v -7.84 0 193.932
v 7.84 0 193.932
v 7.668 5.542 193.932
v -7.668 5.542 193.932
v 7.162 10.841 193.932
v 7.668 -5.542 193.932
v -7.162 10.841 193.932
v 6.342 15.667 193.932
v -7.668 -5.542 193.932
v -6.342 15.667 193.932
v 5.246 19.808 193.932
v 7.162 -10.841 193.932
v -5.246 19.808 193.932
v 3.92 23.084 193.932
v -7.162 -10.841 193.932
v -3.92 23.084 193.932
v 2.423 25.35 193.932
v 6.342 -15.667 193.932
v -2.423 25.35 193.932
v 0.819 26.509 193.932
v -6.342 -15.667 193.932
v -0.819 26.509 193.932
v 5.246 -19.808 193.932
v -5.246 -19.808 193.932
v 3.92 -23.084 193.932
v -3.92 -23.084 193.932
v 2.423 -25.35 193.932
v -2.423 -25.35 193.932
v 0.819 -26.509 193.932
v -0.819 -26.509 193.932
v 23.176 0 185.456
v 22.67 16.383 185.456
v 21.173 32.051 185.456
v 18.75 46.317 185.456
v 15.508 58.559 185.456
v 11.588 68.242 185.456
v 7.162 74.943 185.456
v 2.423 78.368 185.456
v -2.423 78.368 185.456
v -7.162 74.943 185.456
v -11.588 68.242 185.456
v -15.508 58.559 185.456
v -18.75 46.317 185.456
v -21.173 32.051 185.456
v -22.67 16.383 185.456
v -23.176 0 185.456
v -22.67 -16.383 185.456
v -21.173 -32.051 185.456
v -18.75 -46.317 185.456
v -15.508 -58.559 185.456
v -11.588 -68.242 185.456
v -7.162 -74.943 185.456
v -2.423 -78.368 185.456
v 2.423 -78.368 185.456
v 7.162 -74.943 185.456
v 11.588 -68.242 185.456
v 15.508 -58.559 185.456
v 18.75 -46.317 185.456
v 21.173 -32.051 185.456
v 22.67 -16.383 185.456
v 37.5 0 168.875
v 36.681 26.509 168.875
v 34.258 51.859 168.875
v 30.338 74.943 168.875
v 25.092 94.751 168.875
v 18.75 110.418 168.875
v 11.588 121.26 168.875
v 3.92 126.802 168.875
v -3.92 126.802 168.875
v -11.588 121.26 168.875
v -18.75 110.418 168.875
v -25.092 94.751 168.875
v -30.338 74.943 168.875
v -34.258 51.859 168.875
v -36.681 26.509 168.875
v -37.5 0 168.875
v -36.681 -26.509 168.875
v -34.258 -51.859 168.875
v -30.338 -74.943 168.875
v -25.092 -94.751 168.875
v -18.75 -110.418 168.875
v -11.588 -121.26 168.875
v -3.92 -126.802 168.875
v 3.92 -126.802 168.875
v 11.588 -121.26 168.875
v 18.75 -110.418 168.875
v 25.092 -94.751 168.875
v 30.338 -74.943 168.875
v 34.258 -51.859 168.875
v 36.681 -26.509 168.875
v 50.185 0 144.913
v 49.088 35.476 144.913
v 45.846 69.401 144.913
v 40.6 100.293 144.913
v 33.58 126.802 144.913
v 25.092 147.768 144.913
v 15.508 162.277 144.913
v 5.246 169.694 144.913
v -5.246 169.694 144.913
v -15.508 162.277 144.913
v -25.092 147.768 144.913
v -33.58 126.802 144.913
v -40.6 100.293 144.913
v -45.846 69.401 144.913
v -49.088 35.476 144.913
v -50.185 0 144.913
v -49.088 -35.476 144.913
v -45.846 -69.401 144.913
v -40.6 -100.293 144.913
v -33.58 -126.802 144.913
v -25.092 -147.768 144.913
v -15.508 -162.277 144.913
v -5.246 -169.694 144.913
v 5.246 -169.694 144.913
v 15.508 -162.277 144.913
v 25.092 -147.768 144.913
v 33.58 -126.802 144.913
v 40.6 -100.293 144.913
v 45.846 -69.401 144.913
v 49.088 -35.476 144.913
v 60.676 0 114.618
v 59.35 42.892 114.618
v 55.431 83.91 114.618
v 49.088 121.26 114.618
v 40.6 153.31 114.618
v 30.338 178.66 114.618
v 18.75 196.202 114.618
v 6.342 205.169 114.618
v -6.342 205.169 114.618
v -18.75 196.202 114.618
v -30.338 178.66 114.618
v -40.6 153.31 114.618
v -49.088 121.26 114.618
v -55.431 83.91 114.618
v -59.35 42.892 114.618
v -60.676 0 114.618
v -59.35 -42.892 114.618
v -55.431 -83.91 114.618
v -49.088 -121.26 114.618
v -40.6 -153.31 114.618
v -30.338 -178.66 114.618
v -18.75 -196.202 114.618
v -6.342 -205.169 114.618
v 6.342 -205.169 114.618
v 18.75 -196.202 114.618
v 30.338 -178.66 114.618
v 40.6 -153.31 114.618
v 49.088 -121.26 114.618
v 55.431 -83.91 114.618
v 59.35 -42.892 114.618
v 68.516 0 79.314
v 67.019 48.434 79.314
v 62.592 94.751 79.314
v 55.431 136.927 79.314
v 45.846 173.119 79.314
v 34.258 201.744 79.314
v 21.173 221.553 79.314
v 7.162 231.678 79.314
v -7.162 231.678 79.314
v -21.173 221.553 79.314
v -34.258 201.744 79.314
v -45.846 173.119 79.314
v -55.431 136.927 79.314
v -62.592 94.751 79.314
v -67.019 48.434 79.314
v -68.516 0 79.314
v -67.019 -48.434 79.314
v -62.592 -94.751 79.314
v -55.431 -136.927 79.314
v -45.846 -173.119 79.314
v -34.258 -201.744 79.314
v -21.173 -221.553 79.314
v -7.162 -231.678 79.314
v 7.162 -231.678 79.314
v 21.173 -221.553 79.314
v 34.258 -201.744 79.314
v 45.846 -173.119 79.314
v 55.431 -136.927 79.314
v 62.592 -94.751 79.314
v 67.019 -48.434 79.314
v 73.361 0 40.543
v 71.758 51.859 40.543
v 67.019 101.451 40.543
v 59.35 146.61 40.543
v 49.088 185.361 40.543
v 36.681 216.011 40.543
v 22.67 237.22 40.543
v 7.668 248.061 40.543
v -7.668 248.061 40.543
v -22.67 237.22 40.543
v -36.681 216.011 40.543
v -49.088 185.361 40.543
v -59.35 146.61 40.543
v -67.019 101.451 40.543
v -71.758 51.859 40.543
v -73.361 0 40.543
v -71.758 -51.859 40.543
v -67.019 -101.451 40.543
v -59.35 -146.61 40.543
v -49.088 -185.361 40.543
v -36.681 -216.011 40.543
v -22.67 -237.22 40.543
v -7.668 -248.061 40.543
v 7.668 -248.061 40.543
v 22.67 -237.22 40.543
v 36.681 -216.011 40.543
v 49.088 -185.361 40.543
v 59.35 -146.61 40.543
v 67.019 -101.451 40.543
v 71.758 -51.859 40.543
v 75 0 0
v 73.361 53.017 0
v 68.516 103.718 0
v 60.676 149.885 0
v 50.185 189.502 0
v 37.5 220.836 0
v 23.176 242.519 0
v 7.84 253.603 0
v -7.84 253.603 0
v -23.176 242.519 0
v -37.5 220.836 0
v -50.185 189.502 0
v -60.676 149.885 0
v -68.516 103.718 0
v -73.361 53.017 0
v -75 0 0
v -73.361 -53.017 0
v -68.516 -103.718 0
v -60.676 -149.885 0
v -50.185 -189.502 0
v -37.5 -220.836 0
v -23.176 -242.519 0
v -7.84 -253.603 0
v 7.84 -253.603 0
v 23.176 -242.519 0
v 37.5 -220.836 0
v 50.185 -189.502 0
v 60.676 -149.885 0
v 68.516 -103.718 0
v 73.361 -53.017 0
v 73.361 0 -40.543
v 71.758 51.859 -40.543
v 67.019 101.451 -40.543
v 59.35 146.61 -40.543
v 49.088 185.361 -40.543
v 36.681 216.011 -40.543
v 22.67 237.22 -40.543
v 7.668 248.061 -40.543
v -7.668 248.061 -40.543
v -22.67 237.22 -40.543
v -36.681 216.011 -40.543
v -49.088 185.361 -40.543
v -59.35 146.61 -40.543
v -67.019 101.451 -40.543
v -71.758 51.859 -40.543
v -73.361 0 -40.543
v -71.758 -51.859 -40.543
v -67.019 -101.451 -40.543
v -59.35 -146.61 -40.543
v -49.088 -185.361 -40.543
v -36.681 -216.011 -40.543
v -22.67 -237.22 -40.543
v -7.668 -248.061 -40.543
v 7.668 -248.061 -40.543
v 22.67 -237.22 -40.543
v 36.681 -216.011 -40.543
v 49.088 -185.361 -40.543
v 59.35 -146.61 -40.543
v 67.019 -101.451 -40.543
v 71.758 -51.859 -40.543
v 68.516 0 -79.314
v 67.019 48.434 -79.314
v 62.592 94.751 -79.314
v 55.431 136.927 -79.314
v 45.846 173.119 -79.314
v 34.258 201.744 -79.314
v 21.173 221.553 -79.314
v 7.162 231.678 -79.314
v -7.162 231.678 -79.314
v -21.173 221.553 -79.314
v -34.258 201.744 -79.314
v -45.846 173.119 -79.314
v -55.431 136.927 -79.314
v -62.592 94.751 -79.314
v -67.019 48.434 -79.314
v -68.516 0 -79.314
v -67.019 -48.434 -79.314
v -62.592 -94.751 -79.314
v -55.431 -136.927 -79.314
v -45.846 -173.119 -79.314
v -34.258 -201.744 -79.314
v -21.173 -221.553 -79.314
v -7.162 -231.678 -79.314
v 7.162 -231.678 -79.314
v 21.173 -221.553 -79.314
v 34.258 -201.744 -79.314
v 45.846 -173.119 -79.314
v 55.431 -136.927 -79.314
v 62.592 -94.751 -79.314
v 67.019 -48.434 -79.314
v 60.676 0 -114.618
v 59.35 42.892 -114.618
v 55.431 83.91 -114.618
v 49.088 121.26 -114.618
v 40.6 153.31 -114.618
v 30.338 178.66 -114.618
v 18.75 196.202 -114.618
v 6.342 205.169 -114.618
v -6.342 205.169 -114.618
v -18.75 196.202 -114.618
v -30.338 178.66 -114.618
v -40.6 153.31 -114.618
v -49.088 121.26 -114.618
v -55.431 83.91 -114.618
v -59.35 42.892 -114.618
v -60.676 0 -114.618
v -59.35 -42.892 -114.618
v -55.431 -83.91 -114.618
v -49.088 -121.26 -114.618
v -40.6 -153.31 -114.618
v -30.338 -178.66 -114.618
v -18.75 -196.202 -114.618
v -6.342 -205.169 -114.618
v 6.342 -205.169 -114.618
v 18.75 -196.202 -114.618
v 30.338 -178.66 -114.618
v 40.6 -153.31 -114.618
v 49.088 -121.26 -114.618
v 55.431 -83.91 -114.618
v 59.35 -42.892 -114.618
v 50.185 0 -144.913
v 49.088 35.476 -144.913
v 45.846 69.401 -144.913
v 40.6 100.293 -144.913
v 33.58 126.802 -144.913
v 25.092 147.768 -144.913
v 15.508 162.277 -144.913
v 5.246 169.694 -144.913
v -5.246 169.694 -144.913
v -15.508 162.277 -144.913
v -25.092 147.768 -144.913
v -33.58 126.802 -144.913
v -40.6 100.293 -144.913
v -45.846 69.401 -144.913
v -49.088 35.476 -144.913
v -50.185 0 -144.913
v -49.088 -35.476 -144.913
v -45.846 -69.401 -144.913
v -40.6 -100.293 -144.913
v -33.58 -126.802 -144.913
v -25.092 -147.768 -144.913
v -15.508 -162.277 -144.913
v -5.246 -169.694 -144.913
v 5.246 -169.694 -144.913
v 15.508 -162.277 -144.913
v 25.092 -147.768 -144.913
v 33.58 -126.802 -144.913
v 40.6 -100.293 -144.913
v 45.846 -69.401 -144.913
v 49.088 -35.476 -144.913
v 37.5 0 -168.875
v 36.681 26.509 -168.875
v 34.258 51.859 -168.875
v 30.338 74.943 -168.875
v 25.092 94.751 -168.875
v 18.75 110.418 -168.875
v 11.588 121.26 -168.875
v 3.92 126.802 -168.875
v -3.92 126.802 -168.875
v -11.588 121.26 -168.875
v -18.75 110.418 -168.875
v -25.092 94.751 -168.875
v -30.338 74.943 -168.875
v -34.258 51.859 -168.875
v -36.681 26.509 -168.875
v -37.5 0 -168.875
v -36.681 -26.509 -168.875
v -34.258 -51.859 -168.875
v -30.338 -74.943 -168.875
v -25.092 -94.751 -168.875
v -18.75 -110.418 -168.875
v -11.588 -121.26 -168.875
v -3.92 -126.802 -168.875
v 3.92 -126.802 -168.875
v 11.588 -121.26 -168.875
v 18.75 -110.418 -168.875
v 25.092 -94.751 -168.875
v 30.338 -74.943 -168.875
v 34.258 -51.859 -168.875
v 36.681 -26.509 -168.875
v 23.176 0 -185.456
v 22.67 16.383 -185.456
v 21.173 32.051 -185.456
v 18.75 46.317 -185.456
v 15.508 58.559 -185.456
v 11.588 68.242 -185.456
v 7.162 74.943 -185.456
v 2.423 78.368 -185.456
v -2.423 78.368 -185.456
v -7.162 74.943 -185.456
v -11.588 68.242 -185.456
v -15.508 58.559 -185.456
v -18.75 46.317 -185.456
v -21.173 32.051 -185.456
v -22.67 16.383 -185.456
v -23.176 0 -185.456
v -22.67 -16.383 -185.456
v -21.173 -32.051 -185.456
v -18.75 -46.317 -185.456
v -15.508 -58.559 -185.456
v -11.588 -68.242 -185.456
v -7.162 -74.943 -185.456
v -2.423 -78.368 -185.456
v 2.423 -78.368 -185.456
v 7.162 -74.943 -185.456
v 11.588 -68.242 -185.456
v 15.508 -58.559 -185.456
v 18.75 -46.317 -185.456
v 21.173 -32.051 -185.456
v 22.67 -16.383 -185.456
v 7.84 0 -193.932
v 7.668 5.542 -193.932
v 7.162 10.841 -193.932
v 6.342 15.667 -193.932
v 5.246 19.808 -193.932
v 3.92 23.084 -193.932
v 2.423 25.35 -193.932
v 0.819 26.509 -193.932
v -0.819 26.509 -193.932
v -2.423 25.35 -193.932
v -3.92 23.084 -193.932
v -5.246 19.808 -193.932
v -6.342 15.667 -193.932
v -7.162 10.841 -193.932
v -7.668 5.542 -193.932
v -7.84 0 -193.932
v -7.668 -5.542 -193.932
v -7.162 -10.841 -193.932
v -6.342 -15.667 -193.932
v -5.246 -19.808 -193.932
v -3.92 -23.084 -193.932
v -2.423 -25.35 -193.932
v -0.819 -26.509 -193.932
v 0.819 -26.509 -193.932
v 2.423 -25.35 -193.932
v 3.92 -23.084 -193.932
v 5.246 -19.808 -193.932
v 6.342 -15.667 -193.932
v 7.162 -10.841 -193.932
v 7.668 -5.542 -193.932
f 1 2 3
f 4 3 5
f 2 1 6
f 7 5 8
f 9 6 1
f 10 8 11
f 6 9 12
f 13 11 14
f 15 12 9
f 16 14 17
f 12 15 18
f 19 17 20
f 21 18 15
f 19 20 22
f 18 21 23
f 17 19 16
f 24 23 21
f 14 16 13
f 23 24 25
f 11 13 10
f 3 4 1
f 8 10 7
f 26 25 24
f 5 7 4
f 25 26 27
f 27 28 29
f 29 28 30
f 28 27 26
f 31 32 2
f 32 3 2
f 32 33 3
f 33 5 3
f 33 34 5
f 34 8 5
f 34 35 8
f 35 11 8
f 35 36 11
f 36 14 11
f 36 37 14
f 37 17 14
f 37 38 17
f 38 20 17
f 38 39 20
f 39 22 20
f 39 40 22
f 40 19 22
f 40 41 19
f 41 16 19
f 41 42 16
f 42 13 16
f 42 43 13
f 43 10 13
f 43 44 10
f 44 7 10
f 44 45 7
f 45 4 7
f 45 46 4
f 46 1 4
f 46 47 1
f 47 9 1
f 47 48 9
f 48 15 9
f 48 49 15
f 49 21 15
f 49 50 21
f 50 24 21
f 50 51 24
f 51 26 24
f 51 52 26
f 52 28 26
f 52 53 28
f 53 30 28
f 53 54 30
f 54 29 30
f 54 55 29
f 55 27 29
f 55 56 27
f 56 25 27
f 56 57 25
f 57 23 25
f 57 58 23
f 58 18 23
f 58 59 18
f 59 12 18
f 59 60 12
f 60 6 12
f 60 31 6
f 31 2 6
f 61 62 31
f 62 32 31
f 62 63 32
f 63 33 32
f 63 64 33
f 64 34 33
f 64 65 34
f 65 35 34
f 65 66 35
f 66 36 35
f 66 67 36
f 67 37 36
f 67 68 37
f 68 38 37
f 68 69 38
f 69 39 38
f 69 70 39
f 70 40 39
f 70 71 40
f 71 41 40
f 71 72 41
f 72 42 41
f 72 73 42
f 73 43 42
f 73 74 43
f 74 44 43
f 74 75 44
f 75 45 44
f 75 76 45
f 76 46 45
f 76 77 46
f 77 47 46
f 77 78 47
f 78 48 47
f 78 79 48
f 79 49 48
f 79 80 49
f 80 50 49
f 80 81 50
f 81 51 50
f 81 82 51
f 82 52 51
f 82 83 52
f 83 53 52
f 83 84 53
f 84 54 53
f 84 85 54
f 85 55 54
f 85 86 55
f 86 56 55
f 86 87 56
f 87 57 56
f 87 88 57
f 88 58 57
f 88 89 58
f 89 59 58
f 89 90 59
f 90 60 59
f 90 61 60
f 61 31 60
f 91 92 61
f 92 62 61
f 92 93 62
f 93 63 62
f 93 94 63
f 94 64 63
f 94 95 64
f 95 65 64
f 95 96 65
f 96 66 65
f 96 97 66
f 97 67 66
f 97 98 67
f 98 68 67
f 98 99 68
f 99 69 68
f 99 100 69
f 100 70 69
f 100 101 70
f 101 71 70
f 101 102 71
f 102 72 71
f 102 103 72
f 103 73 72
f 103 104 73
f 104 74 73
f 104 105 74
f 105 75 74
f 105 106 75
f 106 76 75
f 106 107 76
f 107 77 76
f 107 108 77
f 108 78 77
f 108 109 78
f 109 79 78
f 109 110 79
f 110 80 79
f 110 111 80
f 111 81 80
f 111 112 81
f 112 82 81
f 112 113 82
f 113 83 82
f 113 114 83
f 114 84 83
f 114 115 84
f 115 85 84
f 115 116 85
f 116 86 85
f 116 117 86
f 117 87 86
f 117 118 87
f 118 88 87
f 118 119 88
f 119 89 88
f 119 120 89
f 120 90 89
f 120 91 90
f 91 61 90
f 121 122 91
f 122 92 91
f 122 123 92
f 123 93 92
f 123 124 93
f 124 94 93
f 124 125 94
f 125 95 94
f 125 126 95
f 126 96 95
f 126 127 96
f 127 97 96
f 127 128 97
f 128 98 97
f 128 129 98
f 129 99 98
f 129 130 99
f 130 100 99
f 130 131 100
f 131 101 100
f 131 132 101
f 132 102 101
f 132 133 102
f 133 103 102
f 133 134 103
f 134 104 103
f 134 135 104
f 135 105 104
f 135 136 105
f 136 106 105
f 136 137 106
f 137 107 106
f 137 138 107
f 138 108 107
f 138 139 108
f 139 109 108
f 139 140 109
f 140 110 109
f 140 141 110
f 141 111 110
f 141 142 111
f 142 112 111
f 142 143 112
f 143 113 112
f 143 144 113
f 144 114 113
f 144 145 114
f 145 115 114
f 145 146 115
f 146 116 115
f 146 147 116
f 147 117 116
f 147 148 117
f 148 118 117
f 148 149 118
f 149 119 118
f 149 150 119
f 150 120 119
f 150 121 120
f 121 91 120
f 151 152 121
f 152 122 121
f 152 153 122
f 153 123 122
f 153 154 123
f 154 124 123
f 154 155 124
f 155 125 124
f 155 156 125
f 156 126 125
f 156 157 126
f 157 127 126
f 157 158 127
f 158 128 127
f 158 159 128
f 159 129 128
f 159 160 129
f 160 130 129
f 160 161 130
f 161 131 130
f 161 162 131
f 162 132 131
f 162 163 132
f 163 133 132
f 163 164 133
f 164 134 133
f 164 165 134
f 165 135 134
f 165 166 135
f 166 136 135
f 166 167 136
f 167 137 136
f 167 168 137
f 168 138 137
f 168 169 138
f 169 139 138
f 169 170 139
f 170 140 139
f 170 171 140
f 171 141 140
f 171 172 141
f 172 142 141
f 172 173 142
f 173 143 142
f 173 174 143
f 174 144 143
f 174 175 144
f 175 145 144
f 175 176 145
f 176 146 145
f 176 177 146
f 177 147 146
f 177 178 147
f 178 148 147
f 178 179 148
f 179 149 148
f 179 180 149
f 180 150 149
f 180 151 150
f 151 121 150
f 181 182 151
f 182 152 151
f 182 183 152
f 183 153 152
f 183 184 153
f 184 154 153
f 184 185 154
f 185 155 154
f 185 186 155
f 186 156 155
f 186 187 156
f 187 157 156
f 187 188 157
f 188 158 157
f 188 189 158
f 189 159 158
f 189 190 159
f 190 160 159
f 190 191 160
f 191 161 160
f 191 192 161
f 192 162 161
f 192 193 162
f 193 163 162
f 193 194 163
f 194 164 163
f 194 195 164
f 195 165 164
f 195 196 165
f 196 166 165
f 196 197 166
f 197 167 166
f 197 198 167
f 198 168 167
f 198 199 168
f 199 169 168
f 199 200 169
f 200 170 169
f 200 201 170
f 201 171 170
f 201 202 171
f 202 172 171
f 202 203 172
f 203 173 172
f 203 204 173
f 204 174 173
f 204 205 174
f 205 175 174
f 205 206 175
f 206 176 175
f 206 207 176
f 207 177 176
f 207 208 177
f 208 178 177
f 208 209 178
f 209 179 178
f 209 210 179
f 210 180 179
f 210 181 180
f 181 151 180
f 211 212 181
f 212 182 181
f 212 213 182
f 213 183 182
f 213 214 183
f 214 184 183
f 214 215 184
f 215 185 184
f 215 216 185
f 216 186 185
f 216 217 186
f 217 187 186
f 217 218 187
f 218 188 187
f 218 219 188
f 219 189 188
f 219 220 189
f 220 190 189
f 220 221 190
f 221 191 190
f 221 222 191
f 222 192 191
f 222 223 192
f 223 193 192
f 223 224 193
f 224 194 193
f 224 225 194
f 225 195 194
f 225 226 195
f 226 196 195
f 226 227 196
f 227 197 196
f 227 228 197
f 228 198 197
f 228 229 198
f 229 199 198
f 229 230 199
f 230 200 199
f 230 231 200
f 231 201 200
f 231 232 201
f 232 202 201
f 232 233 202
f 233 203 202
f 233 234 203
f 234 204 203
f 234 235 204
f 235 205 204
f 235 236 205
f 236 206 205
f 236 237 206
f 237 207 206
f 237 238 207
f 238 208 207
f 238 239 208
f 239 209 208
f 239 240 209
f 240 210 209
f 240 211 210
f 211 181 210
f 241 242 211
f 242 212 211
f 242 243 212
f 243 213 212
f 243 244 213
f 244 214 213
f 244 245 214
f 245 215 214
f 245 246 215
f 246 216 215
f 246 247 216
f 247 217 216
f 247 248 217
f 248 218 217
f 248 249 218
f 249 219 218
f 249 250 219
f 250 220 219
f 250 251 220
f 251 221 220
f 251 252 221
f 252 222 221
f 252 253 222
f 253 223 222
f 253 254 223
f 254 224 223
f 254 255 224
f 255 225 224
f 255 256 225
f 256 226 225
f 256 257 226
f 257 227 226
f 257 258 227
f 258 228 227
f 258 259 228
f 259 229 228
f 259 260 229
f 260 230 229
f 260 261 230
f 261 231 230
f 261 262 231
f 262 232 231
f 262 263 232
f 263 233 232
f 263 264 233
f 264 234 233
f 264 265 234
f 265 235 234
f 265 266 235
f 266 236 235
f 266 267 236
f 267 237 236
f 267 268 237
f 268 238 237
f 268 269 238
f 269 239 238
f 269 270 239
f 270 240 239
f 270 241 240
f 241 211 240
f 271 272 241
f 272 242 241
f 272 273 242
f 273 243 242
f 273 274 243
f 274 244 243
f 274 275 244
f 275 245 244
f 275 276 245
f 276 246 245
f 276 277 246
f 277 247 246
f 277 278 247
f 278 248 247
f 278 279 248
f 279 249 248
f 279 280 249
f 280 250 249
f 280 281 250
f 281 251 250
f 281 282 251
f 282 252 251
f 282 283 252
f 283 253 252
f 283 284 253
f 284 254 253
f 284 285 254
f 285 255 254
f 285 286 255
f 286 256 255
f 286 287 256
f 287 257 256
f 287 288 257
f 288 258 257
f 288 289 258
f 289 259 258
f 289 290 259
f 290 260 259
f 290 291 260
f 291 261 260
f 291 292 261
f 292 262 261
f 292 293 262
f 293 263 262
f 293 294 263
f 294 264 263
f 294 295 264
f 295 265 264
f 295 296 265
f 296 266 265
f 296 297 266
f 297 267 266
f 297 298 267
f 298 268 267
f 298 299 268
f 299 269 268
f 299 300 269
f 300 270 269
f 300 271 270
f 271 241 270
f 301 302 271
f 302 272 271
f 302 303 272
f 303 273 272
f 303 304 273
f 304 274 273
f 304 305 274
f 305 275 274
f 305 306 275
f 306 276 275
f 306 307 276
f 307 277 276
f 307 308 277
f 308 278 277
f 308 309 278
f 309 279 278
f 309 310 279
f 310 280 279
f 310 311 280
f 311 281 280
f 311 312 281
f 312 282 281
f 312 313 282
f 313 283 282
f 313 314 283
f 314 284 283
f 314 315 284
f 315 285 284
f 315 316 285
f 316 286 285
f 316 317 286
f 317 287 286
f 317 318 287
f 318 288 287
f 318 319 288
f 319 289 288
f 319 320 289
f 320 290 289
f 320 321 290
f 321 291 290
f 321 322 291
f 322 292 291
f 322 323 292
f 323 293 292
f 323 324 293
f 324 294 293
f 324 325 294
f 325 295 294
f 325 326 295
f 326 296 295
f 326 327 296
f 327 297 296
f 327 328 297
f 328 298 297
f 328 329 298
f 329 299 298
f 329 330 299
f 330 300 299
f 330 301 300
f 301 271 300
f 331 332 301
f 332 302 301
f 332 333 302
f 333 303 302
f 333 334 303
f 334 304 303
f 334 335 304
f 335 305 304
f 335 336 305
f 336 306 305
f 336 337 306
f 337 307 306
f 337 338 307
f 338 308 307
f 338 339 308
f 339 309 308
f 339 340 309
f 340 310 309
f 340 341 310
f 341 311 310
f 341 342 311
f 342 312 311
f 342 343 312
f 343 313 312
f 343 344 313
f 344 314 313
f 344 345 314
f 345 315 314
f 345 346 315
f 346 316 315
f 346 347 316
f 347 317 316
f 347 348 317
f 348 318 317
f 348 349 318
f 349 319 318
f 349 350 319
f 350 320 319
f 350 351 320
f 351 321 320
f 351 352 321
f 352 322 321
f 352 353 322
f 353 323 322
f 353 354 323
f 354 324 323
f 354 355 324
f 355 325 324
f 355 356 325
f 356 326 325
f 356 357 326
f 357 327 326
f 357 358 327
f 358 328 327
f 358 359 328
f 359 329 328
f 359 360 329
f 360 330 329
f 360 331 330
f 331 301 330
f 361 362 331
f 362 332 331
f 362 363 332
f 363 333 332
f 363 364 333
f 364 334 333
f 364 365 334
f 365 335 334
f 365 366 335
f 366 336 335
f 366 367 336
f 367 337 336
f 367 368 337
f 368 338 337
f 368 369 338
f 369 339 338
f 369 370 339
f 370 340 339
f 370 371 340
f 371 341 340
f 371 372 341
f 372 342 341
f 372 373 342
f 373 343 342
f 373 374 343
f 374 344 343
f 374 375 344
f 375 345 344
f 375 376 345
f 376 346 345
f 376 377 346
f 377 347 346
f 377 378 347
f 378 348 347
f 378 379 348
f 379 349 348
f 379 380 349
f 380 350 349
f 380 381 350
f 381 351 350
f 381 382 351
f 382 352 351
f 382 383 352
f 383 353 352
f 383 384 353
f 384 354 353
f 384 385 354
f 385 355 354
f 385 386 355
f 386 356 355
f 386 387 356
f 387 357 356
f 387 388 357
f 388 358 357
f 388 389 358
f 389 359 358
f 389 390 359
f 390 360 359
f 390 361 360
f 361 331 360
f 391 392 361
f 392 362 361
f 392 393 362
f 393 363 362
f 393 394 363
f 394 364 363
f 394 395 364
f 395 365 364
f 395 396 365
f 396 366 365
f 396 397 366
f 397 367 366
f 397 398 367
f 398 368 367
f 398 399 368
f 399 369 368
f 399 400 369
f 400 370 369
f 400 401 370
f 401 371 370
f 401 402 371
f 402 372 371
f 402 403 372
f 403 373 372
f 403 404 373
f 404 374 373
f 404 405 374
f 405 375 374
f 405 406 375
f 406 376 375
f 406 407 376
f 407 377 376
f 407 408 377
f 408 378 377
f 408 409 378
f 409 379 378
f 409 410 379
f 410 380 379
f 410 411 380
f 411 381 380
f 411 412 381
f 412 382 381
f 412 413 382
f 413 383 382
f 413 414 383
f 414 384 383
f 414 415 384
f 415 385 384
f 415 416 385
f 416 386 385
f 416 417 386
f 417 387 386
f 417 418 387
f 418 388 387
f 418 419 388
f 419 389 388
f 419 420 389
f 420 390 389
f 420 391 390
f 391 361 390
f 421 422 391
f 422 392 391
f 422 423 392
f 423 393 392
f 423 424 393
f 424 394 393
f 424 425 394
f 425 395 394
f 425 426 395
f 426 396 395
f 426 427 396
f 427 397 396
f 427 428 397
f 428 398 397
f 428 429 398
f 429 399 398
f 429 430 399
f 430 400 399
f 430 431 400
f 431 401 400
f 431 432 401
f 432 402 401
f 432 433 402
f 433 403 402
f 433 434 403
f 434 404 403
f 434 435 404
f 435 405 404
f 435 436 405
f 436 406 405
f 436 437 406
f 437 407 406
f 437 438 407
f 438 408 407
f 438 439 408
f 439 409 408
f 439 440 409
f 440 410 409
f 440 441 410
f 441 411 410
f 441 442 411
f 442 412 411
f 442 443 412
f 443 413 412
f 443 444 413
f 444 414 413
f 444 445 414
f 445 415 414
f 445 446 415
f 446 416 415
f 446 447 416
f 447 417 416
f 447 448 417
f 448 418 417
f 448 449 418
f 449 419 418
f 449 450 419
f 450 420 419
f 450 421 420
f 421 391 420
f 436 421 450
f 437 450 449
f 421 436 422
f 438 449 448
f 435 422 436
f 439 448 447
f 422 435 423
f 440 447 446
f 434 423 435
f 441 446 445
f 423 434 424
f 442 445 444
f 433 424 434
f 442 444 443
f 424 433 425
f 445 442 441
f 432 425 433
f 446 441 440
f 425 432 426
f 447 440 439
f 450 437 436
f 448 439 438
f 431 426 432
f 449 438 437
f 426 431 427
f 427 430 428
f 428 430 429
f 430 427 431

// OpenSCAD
// Generated by SolidPython 1.0.1 on 2020-07-29 00:46:47


scale(v = [5, 17, 13]) {
	sphere(r = 15);
}
/***********************************************
*********      SolidPython code:      **********
************************************************
 
# import packages: SolidPython
from solid import *
from solid.utils import *
from itertools import chain, combinations, permutations


class Resize:

    def __init__(self, scad_file):
        self.scad_file = scad_file
        #self.scad_file = import_scad(scad_file)
        # cone/cylinder param:
        self.r1 = 0
        self.r2 = 0
        self.h = 0
        # rectangular prism param:
        self.w = 0
        self.l = 0
        # ellipse param:
        self.r = 0

    # import OpenScad code (file name corresponds to shape)


    # classify shape + parameters
    def assign(self, param1, param2, param3):
        if self.scad_file == 'cone.scad':
            self.r1 = param1
            self.r2 = param2
            self.h = param3
        elif self.scad_file == 'cylinder.scad':
            self.r1 = param1
            self.r2 = param2
            self.h = param3
        elif self.scad_file == 'rectangularPrism.scad':
            self.h = param1
            self.l = param2
            self.w = param3
        else:
            self.r = param1
            self.h = param2

    # resize parameters
    def iterate(self):
        x = range(3, 20, 2)
        i = 1
        if self.scad_file == 'cone.scad':
            tempList = list(permutations(x, 2))
            for temp in tempList:
                param1 = temp[0]
                param2 = temp[1]
                filepath = 'produced_scad_files/' + 'cone' + str(param1) + '_' + str(param2) + '_' + '.scad'
                scad_render_to_file(cylinder(h=param1, r1=param2, r2=0), filepath)

        elif self.scad_file == 'cylinder.scad':
            tempList = list(permutations(x, 3))
            for temp in tempList:
                param1 = temp[0]
                param2 = temp[1]
                filepath = 'produced_scad_files/' + 'cylinder' + str(param1) + '_' + str(param2) + '_' + '.scad'
                scad_render_to_file(cylinder(h=param1, r1=param2, r2=param2), filepath)

        elif self.scad_file == 'rectangularPrism.scad':
            tempList = list(permutations(x, 3))
            for temp in tempList:
                param1 = temp[0]
                param2 = temp[1]
                param3 = temp[2]
                filepath = 'produced_scad_files/' + 'rectangularPrism' + str(param1) + '_' + str(param2) + '_' + str(
                    param3) + '.scad'
                scad_render_to_file(cube(size=(param1, param2, param3)), filepath)

        elif self.scad_file == 'ellipse.scad':
            tempList = list(permutations(x, 4))
            for temp in tempList:
                param1 = temp[0]
                param2 = temp[1]
                param3 = temp[2]
                param4 = temp[3]
                filepath = 'produced_scad_files/' + 'ellipse' + str(param1) + '_' + str(param2) + '_' + str(param3) + '_' + str(param4) + '.scad'
                scad_render_to_file(scale([param1, param2, param3])(sphere(r=param4)), filepath)

    def render_to_scadfile(self):
        scad_render_to_file(scad, 'example.scad') 
 
************************************************/
